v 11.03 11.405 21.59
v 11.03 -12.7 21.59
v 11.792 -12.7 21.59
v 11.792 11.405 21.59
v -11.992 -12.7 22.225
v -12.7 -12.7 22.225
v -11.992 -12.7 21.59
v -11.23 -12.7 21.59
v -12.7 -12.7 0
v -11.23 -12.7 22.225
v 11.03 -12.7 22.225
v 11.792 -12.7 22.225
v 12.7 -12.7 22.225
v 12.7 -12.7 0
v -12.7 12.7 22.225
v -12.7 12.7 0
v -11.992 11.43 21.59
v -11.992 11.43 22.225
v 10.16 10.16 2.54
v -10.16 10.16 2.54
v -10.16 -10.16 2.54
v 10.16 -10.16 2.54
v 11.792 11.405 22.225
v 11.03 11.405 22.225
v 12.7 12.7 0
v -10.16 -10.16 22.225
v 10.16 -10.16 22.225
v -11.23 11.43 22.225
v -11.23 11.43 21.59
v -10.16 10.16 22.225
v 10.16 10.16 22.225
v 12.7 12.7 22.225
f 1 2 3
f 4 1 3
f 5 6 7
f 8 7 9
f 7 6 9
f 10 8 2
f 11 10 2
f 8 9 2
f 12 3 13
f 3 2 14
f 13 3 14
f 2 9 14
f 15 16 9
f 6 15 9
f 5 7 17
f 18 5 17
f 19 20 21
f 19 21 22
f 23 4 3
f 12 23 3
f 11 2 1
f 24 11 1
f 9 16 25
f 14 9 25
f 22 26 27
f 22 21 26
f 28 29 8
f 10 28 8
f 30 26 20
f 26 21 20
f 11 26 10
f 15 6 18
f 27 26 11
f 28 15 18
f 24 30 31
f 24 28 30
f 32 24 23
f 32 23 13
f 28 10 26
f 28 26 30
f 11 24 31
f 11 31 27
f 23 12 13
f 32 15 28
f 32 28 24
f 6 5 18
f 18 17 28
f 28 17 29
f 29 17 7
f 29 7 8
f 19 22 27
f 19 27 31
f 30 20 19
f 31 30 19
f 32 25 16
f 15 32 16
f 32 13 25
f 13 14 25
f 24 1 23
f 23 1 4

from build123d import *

# Parameters (mm, degrees)
F0_W     = 20.32
F0_H     = 20.32
F1_DEPTH = 2.54
F0_W_2   = 25.4
F0_H_2   = 25.4
F2_DEPTH = 21.59
F3_W     = 20.32
F3_H     = 20.32
F4_DEPTH = 0.635


with BuildPart() as f1:
    # F0 (on Top) → F1 (new body)
    with BuildSketch(Plane.XY):
        Rectangle(F0_W, F0_H)
    extrude(amount=F1_DEPTH)

    # F0 (on Top) → F2 (join)
    with BuildSketch(Plane.XY):
        Rectangle(F0_W_2, F0_H_2)
        Rectangle(F0_W, F0_H, mode=Mode.SUBTRACT)
    extrude(amount=F2_DEPTH)

    # F3 (on face) → F4 (join)
    with BuildSketch(Plane.XY.offset(21.59)):
        Polygon((-11.991714, 11.43), (-11.229714, 11.43), (-11.229714, -11.43), (-11.229714, -12.7), (11.030424, -12.7), (11.030424, -11.454967), (11.030424, 11.405033), (11.792424, 11.405033), (11.792424, -11.454967), (11.792424, -12.7), (12.7, -12.7), (12.7, 12.7), (-12.7, 12.7), (-12.7, -12.7), (-11.991714, -12.7), (-11.991714, -11.43), align=None)
        Rectangle(F3_W, F3_H, mode=Mode.SUBTRACT)
    extrude(amount=F4_DEPTH)


solid = f1.part
